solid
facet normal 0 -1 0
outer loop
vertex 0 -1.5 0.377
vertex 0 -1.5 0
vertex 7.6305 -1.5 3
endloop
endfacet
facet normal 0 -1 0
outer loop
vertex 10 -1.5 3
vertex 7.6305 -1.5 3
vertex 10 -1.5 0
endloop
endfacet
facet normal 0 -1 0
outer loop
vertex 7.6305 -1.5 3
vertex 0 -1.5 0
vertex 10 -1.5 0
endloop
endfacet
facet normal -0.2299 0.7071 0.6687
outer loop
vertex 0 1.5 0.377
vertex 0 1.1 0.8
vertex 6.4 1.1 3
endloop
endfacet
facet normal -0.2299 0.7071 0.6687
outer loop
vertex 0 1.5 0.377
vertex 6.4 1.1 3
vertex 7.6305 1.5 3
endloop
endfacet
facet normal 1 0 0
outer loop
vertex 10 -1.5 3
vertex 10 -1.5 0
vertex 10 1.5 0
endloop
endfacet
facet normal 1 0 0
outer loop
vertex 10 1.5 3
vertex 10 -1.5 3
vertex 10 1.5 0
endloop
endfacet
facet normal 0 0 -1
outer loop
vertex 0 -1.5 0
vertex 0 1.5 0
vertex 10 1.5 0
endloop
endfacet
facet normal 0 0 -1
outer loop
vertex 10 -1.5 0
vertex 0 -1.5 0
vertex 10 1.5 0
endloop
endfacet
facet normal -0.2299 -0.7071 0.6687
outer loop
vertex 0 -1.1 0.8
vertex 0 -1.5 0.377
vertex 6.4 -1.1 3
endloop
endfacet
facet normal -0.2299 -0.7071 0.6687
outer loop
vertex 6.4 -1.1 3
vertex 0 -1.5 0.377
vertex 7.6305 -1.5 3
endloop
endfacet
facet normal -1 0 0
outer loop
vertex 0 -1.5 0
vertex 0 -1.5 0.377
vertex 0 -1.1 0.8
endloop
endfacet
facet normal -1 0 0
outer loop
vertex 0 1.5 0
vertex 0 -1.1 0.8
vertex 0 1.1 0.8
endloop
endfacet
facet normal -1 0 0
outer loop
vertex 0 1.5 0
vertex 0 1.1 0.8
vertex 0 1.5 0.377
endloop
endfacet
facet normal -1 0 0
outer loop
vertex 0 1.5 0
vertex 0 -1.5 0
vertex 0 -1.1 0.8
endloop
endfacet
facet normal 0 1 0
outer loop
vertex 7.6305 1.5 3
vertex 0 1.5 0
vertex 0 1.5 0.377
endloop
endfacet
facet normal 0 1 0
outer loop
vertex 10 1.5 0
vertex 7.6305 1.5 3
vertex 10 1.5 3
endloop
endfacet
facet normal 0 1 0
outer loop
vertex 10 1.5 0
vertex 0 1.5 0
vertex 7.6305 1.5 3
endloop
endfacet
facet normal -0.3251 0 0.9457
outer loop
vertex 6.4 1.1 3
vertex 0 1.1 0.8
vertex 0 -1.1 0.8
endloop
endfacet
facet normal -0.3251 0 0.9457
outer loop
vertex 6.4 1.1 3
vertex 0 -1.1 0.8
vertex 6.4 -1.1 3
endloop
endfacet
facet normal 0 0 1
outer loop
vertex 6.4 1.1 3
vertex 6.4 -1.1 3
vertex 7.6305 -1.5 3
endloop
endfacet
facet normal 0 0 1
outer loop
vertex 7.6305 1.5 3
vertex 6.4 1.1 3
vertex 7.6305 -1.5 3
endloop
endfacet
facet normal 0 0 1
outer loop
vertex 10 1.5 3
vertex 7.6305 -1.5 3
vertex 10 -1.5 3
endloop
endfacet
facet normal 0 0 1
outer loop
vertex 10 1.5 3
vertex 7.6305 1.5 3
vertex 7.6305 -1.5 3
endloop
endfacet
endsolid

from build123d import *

# Parameters (mm, degrees)
SKETCH019_W     = 10
SKETCH019_H     = 3
PAD011_DEPTH    = 3
POCKET007_DEPTH = 5
CHAMFER004_SIZE = 0.4


with BuildPart() as part:
    # Sketch019 → Pad011 (new body)
    with BuildSketch(Plane.XY):
        with Locations((5, 0)):
            Rectangle(SKETCH019_W, SKETCH019_H)
    extrude(amount=PAD011_DEPTH)

    # Sketch020 (on Face1 of Pad011) → Pocket007 (cut)
    with BuildSketch(Plane(origin=(0, 1.5, 0), x_dir=(-1, 0, 0), z_dir=(0, 1, 0))):
        Polygon((0, 0.8), (-6.4, 3), (0, 3), align=None)
    extrude(amount=-POCKET007_DEPTH, mode=Mode.SUBTRACT)

    # Chamfer004
    chamfer004_edges = [part.edges().sort_by_distance(p)[0] for p in [
        (3.2, 1.5, 1.9),
        (3.2, -1.5, 1.9),
    ]]
    chamfer(chamfer004_edges, length=CHAMFER004_SIZE)


solid = part.part
